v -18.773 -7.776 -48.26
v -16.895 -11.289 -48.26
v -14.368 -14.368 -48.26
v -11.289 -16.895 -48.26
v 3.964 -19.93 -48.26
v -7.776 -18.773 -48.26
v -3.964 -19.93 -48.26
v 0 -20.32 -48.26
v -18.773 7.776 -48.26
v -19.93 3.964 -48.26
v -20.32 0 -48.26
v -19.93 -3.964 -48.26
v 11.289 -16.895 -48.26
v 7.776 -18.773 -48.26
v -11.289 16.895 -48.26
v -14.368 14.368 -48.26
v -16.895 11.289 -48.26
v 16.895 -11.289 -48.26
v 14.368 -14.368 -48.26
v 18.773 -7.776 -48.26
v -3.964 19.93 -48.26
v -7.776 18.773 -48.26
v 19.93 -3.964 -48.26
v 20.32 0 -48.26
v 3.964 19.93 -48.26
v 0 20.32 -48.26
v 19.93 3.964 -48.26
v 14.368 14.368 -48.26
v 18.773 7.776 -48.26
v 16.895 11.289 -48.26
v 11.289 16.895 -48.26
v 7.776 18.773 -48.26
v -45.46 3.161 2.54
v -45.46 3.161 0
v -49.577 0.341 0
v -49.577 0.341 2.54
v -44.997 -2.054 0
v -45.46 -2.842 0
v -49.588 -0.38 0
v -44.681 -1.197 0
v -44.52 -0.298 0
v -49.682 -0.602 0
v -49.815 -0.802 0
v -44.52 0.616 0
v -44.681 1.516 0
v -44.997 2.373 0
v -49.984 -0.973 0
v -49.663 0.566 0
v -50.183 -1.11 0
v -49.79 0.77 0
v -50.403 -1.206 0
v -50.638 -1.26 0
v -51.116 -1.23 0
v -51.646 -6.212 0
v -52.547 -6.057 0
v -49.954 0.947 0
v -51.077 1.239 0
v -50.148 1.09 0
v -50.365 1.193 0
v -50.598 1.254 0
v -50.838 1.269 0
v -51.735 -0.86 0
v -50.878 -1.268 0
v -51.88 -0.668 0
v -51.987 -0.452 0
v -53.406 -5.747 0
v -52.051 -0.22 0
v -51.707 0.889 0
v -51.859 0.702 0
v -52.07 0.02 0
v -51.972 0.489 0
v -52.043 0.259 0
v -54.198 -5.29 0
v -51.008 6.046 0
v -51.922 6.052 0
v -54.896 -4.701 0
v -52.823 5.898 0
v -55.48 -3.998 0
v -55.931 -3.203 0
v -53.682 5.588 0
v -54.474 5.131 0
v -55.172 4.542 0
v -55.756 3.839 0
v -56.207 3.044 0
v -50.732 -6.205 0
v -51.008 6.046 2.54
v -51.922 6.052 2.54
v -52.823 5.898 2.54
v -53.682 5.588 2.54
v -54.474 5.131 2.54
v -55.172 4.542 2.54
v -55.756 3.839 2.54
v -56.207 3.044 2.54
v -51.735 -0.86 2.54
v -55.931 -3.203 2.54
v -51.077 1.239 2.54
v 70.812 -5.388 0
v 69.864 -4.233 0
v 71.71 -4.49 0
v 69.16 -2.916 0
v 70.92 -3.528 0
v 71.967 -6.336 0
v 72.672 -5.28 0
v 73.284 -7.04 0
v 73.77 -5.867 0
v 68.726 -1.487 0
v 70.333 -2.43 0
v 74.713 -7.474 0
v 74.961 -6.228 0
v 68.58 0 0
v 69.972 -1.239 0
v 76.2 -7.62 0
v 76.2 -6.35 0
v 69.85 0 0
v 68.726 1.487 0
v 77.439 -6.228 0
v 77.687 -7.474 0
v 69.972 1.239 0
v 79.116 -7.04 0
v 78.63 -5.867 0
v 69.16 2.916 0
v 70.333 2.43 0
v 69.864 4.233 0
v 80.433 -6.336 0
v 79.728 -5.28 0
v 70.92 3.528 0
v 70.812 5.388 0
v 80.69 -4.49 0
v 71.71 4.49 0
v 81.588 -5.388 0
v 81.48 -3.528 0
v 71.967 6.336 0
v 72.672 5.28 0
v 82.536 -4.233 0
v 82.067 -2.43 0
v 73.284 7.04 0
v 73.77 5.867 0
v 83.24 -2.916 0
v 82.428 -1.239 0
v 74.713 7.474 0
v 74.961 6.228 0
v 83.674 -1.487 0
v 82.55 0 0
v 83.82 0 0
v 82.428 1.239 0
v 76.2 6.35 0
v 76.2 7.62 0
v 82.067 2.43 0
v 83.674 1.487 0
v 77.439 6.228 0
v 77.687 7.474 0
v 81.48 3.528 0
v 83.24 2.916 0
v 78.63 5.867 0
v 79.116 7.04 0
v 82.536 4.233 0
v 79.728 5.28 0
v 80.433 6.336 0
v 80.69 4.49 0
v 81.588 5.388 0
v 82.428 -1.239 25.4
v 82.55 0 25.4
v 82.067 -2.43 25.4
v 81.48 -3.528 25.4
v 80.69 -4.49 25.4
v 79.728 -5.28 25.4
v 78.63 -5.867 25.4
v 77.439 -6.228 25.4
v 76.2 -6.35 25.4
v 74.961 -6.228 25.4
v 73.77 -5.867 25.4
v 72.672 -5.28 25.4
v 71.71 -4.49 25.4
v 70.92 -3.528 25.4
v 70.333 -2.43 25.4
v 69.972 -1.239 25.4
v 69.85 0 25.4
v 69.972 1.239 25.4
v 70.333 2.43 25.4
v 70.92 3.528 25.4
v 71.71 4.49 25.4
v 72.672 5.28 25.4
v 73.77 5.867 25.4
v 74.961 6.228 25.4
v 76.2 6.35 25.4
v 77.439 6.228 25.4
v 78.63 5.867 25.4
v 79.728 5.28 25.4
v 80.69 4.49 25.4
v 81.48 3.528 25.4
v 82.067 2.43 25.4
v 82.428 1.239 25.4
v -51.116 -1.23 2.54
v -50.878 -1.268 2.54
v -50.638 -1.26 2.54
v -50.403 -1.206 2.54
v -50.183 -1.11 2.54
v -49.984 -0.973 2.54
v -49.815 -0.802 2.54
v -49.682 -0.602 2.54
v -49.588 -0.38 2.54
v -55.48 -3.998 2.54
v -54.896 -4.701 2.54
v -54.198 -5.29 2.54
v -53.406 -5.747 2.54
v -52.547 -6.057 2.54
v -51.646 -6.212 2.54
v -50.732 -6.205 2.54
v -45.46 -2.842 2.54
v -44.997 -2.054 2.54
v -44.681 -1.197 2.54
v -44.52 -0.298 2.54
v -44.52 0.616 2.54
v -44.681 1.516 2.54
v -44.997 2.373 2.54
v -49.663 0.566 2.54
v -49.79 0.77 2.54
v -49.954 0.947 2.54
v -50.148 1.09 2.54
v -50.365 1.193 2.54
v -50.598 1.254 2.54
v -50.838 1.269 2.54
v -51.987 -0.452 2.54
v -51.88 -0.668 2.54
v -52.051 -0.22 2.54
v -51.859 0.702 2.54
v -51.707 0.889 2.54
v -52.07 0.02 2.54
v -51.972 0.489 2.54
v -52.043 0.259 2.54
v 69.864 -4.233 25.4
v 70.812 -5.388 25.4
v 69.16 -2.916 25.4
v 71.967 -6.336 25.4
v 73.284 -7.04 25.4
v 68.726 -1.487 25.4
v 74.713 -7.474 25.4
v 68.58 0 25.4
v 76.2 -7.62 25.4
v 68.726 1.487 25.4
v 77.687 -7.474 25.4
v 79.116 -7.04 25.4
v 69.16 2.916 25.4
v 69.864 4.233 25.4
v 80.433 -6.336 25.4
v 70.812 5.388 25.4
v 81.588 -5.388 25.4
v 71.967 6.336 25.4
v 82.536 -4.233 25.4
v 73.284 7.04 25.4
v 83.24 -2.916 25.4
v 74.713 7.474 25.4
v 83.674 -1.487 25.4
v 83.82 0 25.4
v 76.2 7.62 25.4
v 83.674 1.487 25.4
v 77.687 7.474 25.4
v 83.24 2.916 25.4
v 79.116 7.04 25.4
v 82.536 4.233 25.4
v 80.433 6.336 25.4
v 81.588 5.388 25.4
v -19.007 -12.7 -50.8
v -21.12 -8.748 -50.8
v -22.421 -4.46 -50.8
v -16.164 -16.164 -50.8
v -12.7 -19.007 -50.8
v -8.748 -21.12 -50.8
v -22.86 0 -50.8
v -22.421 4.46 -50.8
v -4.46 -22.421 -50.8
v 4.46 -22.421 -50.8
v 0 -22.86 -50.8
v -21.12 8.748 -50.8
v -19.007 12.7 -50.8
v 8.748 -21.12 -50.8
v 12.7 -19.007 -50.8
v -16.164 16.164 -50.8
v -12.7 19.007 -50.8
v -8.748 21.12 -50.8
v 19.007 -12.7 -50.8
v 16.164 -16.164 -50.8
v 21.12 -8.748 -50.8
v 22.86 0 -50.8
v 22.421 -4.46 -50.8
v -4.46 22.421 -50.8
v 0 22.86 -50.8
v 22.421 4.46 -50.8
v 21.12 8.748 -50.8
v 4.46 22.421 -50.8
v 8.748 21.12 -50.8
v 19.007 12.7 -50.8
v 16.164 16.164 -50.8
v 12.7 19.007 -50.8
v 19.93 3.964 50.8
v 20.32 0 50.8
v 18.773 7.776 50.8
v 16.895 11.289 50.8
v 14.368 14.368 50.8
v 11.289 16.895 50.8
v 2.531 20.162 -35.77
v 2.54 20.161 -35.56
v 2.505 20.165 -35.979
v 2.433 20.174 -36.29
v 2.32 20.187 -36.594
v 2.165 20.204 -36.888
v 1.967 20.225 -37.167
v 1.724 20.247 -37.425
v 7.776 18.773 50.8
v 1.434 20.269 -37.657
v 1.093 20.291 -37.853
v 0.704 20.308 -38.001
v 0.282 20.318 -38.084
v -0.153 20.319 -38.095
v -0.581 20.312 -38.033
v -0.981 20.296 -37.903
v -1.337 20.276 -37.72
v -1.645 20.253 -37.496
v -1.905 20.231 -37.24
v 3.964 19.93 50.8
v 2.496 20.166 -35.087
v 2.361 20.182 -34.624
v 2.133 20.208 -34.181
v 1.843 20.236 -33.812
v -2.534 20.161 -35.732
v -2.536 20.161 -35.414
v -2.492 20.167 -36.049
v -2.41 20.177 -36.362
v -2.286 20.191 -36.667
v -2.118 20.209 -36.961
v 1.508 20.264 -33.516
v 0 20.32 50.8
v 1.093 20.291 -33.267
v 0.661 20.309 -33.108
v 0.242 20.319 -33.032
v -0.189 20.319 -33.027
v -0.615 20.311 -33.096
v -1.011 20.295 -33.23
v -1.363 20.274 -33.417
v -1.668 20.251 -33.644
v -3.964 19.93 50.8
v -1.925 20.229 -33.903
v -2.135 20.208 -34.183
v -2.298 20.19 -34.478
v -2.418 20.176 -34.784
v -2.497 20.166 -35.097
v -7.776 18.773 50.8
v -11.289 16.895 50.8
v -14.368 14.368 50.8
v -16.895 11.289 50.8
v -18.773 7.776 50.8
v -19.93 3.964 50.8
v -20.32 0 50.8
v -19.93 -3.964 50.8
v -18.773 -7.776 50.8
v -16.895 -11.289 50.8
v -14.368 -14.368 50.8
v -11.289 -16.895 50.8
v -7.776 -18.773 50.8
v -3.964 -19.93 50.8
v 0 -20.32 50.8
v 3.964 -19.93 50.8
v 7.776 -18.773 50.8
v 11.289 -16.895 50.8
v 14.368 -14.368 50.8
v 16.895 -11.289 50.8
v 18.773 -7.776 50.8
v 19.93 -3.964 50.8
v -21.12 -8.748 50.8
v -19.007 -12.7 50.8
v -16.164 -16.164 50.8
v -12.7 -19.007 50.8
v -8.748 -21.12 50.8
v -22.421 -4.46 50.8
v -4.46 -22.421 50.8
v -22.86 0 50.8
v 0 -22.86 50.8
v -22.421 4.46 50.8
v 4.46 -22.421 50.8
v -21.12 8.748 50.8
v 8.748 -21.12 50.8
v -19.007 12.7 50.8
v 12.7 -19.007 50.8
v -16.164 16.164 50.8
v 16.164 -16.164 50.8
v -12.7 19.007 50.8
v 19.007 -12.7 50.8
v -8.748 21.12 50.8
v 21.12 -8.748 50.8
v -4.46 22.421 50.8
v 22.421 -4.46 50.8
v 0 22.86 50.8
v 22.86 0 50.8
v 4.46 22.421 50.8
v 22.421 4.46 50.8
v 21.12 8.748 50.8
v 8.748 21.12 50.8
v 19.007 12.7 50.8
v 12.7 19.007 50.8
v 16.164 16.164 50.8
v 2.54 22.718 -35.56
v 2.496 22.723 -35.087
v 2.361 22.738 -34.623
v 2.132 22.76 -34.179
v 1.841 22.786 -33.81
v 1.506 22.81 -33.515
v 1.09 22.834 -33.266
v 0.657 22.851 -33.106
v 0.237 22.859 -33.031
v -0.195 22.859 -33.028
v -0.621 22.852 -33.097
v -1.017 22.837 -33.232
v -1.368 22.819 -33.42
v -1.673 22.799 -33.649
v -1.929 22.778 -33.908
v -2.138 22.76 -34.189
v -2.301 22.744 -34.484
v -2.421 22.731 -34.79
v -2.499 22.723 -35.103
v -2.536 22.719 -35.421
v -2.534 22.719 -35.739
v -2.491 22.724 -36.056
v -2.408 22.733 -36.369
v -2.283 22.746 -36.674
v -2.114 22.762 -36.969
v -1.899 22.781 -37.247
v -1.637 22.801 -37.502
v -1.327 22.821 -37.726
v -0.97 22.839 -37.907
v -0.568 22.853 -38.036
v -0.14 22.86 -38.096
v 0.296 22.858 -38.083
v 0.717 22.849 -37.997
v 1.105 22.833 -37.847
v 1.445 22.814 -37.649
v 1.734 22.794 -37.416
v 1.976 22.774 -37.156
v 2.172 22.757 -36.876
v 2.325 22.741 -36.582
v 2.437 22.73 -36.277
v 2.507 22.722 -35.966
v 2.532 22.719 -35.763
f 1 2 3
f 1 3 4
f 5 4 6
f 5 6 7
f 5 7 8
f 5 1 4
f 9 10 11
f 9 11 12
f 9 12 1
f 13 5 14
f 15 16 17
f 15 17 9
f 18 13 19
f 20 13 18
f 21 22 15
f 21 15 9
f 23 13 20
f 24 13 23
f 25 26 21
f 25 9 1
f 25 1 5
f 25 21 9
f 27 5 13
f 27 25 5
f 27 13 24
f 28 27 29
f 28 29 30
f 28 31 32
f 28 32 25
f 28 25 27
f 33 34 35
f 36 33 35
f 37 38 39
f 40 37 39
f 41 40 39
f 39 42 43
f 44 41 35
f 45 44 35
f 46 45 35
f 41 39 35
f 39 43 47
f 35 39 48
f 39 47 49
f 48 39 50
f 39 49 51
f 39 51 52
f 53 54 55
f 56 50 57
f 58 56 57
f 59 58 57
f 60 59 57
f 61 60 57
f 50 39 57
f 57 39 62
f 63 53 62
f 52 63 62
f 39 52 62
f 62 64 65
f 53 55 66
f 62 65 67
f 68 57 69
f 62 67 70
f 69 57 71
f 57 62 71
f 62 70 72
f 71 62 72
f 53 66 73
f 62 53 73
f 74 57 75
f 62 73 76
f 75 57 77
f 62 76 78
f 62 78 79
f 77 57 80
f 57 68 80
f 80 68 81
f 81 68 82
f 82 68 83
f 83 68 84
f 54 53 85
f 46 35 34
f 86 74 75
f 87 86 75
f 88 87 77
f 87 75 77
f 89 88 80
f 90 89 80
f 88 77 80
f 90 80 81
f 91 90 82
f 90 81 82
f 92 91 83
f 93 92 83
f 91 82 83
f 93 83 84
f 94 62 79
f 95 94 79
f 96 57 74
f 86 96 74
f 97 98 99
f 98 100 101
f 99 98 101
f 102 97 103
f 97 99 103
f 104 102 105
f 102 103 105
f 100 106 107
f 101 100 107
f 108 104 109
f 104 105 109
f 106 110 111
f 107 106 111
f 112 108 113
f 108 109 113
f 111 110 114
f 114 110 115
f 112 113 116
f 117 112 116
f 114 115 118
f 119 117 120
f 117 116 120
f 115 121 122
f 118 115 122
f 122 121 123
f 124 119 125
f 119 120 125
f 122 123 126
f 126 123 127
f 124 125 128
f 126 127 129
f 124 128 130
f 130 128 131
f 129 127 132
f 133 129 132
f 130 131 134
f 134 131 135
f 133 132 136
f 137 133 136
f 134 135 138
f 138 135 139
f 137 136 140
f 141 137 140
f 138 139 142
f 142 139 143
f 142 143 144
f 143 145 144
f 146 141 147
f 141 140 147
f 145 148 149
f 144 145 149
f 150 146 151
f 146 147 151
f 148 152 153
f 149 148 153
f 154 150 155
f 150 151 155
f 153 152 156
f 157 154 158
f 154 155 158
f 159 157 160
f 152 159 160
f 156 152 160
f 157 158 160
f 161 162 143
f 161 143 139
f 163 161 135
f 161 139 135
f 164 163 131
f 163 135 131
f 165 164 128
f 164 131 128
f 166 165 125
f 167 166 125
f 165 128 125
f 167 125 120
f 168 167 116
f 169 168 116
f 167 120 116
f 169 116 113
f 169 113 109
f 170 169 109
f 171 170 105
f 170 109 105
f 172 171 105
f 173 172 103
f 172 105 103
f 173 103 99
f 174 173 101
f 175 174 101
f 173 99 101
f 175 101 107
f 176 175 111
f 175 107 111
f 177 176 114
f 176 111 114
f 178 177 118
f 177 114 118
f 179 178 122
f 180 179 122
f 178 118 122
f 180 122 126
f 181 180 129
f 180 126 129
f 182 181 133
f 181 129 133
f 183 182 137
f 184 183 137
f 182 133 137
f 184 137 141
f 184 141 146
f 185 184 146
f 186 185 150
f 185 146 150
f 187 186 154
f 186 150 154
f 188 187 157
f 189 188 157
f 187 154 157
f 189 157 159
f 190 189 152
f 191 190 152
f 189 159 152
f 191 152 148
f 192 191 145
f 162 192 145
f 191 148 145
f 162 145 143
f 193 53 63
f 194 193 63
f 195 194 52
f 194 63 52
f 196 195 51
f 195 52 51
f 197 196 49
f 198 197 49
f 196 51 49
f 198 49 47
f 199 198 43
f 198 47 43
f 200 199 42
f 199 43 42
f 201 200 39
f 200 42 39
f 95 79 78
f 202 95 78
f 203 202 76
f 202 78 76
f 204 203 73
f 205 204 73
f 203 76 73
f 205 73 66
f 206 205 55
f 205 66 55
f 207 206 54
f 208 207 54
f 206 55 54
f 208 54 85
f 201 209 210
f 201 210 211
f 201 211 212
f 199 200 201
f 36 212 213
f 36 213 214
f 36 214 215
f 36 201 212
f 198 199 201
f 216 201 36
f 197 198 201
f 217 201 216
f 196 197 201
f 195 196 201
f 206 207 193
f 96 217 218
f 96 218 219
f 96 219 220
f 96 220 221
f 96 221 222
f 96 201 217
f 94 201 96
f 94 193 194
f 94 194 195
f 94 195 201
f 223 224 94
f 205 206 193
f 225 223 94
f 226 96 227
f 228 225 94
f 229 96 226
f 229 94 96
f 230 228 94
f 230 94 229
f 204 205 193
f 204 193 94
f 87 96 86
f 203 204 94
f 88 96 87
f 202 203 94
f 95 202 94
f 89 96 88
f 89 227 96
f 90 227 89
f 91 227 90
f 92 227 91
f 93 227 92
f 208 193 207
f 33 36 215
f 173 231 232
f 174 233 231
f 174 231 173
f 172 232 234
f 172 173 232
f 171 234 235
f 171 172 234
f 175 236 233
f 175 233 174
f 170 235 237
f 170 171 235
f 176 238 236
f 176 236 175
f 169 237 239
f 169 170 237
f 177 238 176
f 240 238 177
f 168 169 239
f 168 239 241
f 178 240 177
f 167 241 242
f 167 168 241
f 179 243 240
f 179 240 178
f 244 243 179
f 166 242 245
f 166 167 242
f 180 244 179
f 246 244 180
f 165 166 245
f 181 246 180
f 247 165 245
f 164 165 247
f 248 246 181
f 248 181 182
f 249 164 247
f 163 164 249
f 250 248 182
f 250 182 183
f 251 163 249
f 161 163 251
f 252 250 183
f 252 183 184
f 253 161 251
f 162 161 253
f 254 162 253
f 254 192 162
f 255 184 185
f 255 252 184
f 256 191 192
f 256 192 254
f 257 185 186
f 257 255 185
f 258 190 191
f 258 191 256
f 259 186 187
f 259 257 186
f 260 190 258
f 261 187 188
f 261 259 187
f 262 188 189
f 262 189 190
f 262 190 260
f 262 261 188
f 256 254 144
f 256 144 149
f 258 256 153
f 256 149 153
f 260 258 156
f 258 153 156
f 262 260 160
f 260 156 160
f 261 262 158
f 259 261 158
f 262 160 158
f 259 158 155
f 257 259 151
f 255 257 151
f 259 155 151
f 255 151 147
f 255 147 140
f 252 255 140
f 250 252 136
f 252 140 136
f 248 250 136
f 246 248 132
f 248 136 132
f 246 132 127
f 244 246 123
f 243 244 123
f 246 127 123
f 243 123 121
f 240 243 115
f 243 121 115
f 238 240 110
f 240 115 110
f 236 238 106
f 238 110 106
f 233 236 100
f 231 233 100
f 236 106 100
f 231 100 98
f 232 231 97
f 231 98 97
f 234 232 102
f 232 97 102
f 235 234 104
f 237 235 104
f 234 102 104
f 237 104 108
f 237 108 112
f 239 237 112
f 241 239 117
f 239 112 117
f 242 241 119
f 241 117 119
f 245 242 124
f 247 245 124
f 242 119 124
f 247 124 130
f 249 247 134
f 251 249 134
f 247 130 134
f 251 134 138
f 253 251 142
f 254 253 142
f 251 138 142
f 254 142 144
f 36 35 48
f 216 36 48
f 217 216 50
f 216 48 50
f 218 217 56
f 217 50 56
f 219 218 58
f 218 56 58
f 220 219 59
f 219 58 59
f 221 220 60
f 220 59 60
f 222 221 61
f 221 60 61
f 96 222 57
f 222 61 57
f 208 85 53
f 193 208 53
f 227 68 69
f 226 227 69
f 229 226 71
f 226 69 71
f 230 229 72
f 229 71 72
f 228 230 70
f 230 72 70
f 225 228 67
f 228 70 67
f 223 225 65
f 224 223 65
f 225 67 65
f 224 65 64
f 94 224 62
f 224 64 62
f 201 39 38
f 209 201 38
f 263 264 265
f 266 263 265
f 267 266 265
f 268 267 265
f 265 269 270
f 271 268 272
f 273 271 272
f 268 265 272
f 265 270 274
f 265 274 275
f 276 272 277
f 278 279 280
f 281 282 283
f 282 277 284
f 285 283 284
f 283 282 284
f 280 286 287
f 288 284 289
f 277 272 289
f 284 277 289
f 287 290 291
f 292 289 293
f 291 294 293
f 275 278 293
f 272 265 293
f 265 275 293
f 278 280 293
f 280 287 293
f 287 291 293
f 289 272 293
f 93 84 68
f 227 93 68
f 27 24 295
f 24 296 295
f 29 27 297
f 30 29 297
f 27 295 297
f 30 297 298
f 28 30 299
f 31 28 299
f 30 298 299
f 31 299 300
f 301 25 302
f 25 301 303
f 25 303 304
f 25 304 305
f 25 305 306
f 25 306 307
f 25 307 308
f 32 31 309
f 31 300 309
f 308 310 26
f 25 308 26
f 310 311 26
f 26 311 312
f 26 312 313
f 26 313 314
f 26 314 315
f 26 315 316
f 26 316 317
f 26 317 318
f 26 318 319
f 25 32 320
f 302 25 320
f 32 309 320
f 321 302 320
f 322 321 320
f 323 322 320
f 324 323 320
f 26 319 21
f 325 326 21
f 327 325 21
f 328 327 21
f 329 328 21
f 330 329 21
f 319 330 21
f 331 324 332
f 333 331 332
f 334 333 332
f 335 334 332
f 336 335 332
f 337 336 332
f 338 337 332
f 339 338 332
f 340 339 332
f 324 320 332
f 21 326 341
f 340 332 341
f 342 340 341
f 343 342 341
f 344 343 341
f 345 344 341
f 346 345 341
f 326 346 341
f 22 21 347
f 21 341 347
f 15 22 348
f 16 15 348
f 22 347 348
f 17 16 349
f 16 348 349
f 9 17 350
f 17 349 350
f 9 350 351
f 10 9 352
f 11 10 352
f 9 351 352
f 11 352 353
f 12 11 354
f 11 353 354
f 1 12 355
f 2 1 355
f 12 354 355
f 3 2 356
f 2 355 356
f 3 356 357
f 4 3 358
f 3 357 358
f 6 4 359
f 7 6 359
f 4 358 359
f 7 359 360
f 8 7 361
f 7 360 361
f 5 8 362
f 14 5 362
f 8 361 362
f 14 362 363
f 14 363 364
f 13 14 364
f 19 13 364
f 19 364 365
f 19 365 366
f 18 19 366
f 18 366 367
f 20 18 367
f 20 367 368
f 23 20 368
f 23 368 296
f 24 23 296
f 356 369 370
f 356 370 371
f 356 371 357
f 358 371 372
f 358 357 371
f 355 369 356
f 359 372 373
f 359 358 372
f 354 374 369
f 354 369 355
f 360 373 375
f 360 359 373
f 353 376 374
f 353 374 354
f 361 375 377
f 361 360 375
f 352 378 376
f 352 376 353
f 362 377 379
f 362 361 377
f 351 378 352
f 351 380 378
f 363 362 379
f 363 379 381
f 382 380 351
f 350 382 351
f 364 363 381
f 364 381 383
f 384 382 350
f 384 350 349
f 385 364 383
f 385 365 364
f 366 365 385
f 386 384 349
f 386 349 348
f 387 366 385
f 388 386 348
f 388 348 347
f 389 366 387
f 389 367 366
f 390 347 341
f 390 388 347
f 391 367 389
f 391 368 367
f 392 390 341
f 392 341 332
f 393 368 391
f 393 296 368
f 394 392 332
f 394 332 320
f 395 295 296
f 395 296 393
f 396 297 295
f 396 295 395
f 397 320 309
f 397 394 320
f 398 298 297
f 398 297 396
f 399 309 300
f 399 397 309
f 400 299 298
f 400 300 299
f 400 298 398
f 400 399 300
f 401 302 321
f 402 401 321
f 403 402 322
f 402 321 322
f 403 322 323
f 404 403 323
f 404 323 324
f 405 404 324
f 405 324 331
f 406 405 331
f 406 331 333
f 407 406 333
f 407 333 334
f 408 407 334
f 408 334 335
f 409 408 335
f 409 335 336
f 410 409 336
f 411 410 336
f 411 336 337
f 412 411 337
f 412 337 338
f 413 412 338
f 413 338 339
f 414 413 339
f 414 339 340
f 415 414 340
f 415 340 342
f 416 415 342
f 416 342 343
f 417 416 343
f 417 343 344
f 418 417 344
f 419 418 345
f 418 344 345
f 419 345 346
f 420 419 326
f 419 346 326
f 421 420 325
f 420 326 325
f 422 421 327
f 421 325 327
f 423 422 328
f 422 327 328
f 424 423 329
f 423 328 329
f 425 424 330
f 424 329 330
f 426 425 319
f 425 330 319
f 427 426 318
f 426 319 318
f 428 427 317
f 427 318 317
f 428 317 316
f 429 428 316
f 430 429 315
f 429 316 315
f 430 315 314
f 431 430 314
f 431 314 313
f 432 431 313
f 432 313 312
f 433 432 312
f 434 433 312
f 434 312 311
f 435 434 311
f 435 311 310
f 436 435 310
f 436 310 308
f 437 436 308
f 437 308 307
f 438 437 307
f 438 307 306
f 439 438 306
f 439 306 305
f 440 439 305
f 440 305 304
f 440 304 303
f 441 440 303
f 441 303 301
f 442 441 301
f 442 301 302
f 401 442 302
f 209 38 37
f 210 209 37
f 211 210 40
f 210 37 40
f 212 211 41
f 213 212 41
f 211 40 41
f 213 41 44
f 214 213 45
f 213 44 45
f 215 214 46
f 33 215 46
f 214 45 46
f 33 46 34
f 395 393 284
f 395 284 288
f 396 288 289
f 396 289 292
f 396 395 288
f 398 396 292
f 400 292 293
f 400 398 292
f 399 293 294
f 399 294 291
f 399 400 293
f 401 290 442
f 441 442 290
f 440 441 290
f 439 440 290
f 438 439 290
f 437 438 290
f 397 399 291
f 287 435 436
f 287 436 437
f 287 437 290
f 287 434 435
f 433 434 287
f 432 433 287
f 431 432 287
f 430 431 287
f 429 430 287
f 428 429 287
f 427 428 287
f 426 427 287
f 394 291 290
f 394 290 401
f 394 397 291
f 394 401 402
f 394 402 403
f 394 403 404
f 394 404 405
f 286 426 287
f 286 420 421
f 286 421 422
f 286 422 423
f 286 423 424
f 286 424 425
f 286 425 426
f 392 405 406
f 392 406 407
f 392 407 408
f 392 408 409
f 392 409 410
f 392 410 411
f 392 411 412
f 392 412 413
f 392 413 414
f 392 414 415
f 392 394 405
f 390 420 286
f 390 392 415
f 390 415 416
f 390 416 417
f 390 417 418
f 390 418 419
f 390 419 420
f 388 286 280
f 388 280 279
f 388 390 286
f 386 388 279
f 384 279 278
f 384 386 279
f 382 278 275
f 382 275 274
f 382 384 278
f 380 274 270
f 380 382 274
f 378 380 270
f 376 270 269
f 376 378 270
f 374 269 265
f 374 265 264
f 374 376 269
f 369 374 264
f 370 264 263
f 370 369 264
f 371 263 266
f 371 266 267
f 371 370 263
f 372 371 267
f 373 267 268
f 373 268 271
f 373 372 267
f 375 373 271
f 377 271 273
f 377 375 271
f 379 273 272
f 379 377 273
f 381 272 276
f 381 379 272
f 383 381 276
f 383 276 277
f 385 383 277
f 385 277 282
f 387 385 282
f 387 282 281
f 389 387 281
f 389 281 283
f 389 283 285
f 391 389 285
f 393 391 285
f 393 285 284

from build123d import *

# Parameters (mm, degrees)
F0_R      = 22.86
F1_DEPTH  = 50.8
F2_T      = -2.54
F3_R      = 2.54
F4_DEPTH  = 22.94505
F5_R      = 7.62
F6_DEPTH  = 25.4
F7_R      = 6.35
F8_DEPTH  = 25.4
F9_R      = 1.27
F10_DEPTH = 2.54
F12_DEPTH = 2.54
F13_COUNT = 3
F13_ANGLE = 240


with BuildPart() as f1:
    # F0 (on Top) → F1 (new body, symmetric)
    with BuildSketch(Plane.XY):
        Circle(F0_R)
    extrude(amount=F1_DEPTH, both=True)

    # F2
    f2_openings = [f1.faces().sort_by_distance(p)[0] for p in [
        (0, 0, 50.8),
    ]]
    offset(amount=F2_T, openings=f2_openings)

    # F3 (on Front) → F4 (cut)
    with BuildSketch(Plane.XZ):
        with Locations((0, -35.56)):
            Circle(F3_R)
    extrude(amount=-F4_DEPTH, mode=Mode.SUBTRACT)


with BuildPart() as f6:
    # F5 (on Top) → F6 (new body)
    with BuildSketch(Plane.XY):
        with Locations((76.2, 0)):
            Circle(F5_R)
    extrude(amount=F6_DEPTH)

    # F7 (on face) → F8 (cut)
    with BuildSketch(Plane(origin=(0, 0, 0), x_dir=(1, 0, 0), z_dir=(0, 0, -1))):
        with Locations((76.2, 0)):
            Circle(F7_R)
    extrude(amount=-F8_DEPTH, mode=Mode.SUBTRACT)


with BuildPart() as f10:
    # F9 (on Top) → F10 (new body)
    with BuildSketch(Plane.XY):
        with Locations((-50.8, 0)):
            Circle(F9_R)
    extrude(amount=F10_DEPTH)

    # F11 (on Top) → F12 (join)
    with BuildSketch(Plane.XY):
        with BuildLine():
            ThreePointArc((-49.5766793402, 0.3411547498), (-49.5417239496, 0.1721667245), (-49.53, 0))
            ThreePointArc((-49.53, 0), (-49.5446148316, -0.1921147546), (-49.588122959, -0.3798078954))
            Line((-49.588122959, -0.3798078954), (-45.4602462803, -2.8423268697))
            ThreePointArc((-45.4602462803, -2.8423268697), (-44.4995774109, 0.1592836459), (-45.4602462803, 3.1608941616))
            Line((-45.4602462803, 3.1608941616), (-49.5766793402, 0.3411547498))
        make_face()
    extrude(amount=F12_DEPTH)

    # F13: F10 ×3 about axis
    f13_axis = Axis((-50.8, 0, 0), (0, 0, -1))


with BuildPart() as f10_1:
    add(f10.part)
    for i in range(1, F13_COUNT):
        add(f10.part.rotate(f13_axis, i * F13_ANGLE / (F13_COUNT - 1)))


solid = Compound([f1.part, f6.part, f10_1.part])
